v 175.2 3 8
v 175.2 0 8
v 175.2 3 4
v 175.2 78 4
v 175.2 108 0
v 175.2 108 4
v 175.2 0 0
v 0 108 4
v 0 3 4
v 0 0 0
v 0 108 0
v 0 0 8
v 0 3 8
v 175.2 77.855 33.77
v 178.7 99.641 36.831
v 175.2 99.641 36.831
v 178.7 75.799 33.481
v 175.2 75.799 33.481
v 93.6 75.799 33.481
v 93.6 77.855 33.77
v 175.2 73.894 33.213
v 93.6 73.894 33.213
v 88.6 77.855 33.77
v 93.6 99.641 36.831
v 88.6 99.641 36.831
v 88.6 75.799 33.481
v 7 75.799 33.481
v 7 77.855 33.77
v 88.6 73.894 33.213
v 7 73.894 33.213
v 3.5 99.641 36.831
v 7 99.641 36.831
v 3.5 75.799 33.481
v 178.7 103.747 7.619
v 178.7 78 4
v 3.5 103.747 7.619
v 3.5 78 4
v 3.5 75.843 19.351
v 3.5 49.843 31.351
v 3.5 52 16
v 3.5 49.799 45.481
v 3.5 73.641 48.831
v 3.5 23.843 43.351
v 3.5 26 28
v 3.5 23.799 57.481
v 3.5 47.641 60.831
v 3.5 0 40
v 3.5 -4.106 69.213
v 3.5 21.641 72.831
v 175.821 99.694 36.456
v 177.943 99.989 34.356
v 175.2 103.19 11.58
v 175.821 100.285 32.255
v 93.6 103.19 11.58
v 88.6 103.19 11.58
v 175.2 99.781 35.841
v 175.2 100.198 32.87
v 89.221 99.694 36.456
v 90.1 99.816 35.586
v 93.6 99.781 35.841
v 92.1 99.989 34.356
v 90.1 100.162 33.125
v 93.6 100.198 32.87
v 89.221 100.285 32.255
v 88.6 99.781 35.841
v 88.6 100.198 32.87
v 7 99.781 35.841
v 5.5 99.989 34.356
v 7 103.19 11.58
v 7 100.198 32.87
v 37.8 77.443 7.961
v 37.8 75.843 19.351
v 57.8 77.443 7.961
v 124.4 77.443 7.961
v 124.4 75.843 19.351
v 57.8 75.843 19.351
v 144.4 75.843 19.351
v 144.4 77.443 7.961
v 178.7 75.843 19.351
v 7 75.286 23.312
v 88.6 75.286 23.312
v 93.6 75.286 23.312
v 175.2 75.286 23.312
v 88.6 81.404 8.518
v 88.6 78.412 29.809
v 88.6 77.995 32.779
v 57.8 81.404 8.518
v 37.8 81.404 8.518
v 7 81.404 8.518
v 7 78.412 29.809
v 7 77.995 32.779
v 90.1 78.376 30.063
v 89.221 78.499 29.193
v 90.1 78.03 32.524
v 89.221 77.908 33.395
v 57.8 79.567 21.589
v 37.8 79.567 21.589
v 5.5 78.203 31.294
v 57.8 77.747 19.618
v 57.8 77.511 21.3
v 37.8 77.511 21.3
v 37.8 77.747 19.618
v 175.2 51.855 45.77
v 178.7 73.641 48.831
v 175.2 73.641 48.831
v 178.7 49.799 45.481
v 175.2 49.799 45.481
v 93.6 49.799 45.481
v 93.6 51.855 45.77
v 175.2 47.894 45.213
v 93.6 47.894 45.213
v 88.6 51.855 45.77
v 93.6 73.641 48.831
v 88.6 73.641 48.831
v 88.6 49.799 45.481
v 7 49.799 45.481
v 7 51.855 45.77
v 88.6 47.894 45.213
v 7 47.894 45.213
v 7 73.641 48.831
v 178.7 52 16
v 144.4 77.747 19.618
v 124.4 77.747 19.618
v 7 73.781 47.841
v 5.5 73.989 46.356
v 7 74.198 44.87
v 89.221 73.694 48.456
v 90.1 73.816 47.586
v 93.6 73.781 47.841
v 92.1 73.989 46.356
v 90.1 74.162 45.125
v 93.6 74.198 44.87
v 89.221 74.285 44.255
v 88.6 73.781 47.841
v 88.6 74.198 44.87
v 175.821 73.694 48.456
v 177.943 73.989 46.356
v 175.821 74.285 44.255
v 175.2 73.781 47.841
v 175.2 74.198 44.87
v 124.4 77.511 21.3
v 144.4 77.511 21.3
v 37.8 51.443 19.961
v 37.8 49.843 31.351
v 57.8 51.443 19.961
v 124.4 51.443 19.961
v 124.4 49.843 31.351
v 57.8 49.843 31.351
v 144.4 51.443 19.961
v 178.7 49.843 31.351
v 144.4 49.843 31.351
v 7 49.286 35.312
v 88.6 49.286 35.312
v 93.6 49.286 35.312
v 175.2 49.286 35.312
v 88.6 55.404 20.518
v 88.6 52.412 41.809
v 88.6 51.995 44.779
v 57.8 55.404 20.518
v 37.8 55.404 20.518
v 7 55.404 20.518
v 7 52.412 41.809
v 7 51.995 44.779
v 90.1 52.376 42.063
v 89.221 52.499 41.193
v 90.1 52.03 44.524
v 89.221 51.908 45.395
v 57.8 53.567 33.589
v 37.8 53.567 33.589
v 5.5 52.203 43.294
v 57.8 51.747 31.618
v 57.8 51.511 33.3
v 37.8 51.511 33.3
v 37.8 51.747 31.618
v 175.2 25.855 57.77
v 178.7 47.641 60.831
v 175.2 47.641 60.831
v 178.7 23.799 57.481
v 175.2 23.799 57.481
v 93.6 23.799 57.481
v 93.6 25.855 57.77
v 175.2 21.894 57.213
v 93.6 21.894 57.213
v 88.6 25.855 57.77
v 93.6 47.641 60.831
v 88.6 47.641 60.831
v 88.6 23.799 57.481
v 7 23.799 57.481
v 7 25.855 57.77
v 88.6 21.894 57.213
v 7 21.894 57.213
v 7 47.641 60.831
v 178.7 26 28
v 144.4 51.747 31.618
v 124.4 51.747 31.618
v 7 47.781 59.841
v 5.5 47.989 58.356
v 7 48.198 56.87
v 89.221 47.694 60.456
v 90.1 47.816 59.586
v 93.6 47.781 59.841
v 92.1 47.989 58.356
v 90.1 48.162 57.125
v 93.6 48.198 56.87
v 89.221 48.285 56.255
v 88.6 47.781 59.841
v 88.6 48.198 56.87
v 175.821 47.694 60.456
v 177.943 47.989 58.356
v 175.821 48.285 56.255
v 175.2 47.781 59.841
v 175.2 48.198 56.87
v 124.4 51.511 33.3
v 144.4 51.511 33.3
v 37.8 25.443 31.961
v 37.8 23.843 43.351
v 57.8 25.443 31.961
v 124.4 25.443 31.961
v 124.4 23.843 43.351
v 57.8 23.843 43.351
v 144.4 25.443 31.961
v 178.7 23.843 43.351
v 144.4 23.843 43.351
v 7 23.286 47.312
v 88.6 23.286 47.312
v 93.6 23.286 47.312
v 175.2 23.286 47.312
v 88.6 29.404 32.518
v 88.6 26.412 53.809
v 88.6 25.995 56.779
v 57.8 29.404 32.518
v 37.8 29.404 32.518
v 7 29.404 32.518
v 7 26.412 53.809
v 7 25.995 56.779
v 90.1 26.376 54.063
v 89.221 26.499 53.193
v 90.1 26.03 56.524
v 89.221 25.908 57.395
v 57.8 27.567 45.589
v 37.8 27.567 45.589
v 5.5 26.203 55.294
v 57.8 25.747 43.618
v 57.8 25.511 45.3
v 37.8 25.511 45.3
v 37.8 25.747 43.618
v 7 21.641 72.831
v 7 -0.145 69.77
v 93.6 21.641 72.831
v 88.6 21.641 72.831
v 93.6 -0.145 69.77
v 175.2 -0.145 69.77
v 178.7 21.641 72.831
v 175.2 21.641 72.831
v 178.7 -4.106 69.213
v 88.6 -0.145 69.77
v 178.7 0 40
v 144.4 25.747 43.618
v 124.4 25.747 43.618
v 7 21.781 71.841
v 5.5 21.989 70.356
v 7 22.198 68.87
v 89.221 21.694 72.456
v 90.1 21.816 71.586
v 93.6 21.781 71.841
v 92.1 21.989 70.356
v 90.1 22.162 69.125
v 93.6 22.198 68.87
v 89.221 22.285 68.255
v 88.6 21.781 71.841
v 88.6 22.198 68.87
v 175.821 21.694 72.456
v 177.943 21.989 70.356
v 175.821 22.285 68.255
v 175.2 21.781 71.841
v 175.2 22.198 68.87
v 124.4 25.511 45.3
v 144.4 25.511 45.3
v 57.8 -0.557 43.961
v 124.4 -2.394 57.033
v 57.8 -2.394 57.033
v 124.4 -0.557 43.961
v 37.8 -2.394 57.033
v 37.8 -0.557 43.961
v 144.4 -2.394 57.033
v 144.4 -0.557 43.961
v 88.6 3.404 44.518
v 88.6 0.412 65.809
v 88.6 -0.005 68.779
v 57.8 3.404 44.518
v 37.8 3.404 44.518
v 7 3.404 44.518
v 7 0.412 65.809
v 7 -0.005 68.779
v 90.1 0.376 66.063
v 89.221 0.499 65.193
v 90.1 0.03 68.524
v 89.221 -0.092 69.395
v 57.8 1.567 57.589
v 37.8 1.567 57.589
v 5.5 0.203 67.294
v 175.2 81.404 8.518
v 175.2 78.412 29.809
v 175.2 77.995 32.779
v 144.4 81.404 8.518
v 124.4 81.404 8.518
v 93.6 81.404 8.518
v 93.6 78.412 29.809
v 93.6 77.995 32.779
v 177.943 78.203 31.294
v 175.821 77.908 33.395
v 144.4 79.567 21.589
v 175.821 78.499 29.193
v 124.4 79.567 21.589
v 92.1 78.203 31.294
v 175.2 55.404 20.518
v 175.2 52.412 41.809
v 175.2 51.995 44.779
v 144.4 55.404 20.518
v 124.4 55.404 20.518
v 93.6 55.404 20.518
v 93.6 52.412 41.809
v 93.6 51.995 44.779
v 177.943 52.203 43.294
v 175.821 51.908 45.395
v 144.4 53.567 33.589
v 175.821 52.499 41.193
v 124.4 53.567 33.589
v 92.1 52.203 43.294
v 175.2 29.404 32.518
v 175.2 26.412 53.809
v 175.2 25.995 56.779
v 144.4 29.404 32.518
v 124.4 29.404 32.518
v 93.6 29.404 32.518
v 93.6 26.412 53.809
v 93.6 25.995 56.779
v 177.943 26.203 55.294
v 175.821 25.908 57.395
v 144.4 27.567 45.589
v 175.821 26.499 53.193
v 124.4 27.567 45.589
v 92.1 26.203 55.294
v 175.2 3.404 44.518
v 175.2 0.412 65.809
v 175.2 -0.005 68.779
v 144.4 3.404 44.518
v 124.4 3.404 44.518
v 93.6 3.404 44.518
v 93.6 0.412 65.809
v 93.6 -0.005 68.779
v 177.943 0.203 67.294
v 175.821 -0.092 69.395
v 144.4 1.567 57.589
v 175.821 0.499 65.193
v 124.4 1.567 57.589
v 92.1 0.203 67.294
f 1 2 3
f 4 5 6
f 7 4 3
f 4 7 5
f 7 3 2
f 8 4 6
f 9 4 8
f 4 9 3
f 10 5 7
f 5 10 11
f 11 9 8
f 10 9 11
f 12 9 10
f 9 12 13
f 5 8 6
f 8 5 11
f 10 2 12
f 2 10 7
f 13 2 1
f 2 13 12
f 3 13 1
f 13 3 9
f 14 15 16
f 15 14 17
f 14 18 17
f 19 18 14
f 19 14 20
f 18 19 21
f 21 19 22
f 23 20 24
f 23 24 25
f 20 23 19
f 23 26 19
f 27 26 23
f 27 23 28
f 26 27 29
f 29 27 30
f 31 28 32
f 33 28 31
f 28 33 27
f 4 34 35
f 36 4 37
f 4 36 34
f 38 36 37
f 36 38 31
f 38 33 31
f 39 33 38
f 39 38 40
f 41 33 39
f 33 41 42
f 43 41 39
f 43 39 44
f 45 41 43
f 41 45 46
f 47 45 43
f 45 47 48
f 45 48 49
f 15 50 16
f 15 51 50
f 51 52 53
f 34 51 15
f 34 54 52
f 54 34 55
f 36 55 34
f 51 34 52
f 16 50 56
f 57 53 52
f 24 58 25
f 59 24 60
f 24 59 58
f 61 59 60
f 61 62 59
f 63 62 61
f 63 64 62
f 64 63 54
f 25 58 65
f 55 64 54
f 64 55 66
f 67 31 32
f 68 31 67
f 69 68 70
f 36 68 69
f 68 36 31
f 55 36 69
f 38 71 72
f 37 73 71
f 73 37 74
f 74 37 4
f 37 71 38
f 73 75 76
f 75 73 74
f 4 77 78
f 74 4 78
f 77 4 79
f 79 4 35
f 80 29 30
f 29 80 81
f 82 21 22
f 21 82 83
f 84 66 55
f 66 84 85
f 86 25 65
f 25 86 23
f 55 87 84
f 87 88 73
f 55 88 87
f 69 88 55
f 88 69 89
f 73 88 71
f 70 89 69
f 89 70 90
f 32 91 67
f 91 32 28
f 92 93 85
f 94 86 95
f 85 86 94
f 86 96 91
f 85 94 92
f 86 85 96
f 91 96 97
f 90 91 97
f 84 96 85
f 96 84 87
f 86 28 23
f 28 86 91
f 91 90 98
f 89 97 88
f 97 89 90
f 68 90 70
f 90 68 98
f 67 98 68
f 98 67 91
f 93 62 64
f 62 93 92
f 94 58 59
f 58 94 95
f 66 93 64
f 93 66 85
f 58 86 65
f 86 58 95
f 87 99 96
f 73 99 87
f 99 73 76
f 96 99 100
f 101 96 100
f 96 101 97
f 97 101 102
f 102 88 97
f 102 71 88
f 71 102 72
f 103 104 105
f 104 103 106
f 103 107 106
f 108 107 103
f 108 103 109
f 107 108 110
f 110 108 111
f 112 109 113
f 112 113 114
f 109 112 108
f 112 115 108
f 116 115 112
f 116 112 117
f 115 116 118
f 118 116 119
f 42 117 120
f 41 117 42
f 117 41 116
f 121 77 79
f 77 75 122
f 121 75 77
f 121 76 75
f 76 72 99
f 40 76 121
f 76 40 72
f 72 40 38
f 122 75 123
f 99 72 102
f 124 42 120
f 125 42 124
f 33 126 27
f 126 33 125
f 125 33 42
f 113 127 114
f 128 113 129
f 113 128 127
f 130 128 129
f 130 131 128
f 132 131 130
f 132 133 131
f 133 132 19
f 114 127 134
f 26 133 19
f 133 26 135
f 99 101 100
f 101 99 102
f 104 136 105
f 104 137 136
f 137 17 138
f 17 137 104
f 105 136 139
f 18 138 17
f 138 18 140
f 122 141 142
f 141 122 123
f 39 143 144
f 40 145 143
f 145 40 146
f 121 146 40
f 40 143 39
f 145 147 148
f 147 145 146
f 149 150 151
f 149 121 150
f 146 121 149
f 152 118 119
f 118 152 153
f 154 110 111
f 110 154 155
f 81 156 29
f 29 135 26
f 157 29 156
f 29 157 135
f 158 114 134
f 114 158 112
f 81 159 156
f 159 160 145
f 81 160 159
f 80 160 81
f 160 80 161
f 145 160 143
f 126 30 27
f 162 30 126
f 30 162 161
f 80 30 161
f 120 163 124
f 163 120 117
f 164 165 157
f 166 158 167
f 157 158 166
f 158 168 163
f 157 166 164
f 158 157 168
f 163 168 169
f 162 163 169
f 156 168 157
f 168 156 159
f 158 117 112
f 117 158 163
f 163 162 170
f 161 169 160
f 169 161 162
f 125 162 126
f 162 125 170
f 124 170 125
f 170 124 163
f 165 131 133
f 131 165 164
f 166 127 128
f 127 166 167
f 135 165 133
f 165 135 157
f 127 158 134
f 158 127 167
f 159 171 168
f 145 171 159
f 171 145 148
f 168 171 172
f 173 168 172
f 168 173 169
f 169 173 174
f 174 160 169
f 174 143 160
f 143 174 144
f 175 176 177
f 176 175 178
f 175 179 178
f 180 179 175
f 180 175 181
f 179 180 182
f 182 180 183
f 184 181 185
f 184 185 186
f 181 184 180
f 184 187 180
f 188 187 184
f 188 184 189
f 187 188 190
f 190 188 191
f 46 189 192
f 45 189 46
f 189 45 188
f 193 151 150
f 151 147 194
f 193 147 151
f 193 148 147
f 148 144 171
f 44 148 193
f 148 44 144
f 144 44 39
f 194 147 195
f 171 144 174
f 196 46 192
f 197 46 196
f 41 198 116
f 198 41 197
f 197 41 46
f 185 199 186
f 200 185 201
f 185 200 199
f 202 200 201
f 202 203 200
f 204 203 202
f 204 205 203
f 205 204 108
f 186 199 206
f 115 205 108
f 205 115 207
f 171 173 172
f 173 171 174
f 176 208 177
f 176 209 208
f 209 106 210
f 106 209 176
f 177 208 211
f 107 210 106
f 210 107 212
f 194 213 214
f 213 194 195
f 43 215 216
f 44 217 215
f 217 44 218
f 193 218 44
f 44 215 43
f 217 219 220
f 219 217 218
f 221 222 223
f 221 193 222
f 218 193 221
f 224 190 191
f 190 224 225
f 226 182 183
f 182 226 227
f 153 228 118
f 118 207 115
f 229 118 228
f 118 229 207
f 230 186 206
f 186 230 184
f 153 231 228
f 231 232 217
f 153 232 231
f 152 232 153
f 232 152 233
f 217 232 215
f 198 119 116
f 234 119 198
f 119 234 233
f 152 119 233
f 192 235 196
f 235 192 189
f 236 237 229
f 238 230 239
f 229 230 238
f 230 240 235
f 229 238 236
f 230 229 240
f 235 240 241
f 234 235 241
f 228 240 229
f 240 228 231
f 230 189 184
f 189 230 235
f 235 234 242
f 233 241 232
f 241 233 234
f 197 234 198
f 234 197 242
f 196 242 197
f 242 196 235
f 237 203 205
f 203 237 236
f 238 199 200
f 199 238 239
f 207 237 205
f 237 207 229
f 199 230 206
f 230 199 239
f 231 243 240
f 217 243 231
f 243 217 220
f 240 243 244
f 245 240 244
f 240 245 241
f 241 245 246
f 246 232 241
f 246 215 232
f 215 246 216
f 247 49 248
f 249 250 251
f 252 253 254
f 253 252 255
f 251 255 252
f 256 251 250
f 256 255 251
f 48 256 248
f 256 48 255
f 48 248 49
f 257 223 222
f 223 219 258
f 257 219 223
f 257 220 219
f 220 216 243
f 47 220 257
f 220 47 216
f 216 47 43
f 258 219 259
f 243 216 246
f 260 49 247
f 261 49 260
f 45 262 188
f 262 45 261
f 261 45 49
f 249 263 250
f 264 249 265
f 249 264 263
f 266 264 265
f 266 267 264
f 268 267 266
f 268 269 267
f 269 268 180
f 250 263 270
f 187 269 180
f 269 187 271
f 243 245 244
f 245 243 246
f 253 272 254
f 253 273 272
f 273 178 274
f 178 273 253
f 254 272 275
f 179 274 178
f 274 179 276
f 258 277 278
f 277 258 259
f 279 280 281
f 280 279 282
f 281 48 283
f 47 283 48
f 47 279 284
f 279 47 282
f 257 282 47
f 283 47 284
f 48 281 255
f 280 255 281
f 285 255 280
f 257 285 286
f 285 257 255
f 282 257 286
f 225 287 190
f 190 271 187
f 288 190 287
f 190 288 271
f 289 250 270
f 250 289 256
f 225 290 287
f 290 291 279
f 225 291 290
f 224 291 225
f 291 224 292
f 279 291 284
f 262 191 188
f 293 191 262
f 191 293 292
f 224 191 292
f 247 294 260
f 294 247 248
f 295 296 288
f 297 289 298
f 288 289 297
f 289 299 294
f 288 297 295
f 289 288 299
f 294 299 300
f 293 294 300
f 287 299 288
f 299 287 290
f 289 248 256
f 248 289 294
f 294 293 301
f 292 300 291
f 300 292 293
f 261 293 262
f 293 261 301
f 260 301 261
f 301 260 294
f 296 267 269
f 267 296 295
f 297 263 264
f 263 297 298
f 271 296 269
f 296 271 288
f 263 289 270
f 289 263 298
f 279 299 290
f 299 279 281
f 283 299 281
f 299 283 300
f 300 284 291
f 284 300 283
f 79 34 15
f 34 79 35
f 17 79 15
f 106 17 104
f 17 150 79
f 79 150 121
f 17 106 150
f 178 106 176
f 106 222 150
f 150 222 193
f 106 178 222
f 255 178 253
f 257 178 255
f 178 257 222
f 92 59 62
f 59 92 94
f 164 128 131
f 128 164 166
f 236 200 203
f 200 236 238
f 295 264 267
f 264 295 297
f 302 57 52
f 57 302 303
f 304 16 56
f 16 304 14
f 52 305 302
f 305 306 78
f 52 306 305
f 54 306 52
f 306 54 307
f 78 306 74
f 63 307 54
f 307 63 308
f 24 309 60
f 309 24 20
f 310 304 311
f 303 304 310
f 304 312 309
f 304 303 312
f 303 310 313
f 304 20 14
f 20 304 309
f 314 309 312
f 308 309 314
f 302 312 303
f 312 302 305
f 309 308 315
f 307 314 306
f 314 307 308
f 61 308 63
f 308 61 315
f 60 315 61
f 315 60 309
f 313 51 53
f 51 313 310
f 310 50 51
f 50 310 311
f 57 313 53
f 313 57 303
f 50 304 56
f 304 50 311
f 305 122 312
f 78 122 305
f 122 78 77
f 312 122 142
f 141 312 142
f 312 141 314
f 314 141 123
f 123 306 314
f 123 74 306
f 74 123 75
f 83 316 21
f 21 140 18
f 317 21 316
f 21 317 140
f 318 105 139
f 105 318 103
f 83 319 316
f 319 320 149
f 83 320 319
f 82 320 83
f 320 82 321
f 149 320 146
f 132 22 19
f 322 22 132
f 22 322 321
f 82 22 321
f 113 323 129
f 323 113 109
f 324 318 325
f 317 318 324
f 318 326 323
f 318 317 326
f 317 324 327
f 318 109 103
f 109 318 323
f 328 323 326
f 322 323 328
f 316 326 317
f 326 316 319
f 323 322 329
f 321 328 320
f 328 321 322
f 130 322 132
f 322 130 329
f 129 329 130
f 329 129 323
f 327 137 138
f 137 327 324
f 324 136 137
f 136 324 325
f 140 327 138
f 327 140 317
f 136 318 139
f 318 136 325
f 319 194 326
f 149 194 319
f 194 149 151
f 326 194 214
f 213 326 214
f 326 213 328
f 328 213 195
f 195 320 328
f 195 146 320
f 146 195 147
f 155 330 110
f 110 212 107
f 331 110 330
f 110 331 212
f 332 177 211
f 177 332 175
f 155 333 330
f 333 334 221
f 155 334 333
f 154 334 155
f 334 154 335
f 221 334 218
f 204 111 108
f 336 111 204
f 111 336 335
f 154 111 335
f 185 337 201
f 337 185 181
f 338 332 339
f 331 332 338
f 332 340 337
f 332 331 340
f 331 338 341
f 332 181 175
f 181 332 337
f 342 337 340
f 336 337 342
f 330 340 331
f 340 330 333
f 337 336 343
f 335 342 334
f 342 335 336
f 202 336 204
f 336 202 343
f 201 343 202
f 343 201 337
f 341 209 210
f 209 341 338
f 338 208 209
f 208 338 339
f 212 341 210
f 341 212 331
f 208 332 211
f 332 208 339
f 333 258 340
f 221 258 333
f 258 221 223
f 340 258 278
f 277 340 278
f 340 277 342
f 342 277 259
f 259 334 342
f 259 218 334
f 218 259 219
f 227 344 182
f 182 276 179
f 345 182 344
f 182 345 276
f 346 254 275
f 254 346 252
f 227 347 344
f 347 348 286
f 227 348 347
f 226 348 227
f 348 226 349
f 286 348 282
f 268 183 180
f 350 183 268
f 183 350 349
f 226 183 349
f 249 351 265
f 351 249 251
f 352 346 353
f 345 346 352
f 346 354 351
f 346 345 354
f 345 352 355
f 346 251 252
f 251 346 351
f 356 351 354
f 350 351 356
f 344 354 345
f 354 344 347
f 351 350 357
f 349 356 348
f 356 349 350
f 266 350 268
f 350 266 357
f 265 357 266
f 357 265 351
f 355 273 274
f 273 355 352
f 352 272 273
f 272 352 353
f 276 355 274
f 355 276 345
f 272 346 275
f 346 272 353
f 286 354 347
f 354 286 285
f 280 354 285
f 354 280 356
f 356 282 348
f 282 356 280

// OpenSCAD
// pb_slab_display_v1.scad — PrimeBind PSA Card Show Display
//
// Freestanding waterfall stand for PSA slabs at vendor shows.
// 2 columns × 4 rows = 8 slabs visible simultaneously.
// Slabs slot in from the top, tilt 8° back — stable, easy to pull out.
// Grade label and card face fully visible from the front.
//
// Workflow: transport in slab book → transfer slabs to display at show
//
// Print: Matte PLA | flat on bed | no supports
// Minitest: scale to 40% to verify slot fit before full print

// ── PSA slab (confirmed dimensions) ─────────────────────────────────────────
SLAB_W = 81.0;    // 3.19″
SLAB_H = 136.5;   // 5.38″
SLAB_T = 6.35;    // 0.25″

// ── Layout ───────────────────────────────────────────────────────────────────
COLS = 2;
ROWS = 4;

// ── Slot geometry ─────────────────────────────────────────────────────────────
SLOT_W     = SLAB_W + 0.6;   // 81.6mm — snug but hand-removable
SLOT_DEPTH = 22;              // how deep slab sits in slot (bottom lip)
SLOT_TILT  = 8;               // degrees backward — stable, grade label visible
LIP_H      = 4;               // bottom ledge height that slab rests on

// ── Structure ─────────────────────────────────────────────────────────────────
WALL       = 3.5;   // side walls and dividers between columns
COL_GAP    = 5;     // gap between the two columns (wider for finger access)
BASE_T     = 4;     // base plate thickness
BACK_T     = 4;     // back wall thickness

// ── Row stepping (cascade) ────────────────────────────────────────────────────
// Each row steps back and up, creating the waterfall silhouette.
// Deeper step = more separation = easier to grab individual slabs.
ROW_STEP_D = 26;    // horizontal depth per step (front to back)
ROW_STEP_H = 12;    // height rise per step

// ── Derived ───────────────────────────────────────────────────────────────────
// Slot internal height — slab sits SLOT_DEPTH deep, the rest is open above
// The slot guides the slab sides; bottom lip stops it from sliding through
SLOT_H_INTERNAL = SLOT_DEPTH + LIP_H;

// Total stand width
STAND_W = WALL + SLOT_W + COL_GAP + SLOT_W + WALL;   // ~178mm

// Total stand depth (base plate)
STAND_D = ROWS * ROW_STEP_D + BACK_T;   // ~108mm

// Total stand height at back row
STAND_H = BASE_T + ROWS * ROW_STEP_H + SLOT_H_INTERNAL;   // ~90mm

echo("─────────────────────────────────────");
echo("Stand footprint:", STAND_W, "×", STAND_D, "mm");
echo("Stand height:", STAND_H, "mm");
echo("Slot width:", SLOT_W, "mm");
echo("─────────────────────────────────────");


// ── Single slot ───────────────────────────────────────────────────────────────
// A slot holds one PSA slab. The slab enters from the top, rests on the
// lip at the bottom, and is cradled by two side walls.
// The assembly is rotated SLOT_TILT° so the slab leans back.
module slot(col_x, row) {
    x = col_x;
    // Each row steps back (y) and up (z)
    base_z = BASE_T + row * ROW_STEP_H;
    base_y = (ROWS - 1 - row) * ROW_STEP_D;  // row 0 = front, row 3 = back

    translate([x, base_y, base_z])
    rotate([SLOT_TILT, 0, 0])
    difference() {
        // Outer slot body
        cube([SLOT_W + WALL*2, BACK_T + SLOT_DEPTH, SLOT_H_INTERNAL + WALL]);

        // Inner slot void (slab sits here)
        translate([WALL, BACK_T, LIP_H])
            cube([SLOT_W, SLOT_DEPTH + 0.1, SLOT_H_INTERNAL]);

        // Chamfer at top opening to guide slab in
        translate([WALL - 1.5, BACK_T, LIP_H + SLOT_H_INTERNAL - 3])
            rotate([0, 45, 0])
            cube([3, SLOT_DEPTH + 1, 3]);
        translate([WALL + SLOT_W - 1.5, BACK_T, LIP_H + SLOT_H_INTERNAL - 3])
            rotate([0, 45, 0])
            cube([3, SLOT_DEPTH + 1, 3]);

        // Finger notch in back wall — reach behind slab to push it up
        translate([WALL + SLOT_W/2 - 10, -0.1, LIP_H])
            cube([20, BACK_T + 0.2, SLOT_DEPTH * 0.6]);
    }
}


// ── Base plate ────────────────────────────────────────────────────────────────
module base_plate() {
    cube([STAND_W, STAND_D, BASE_T]);

    // Small front lip to stop slabs if pulled forward too aggressively
    translate([0, 0, BASE_T])
        cube([STAND_W, 3, 4]);
}


// ── Full display stand ────────────────────────────────────────────────────────
module slab_display() {
    // Base
    base_plate();

    // Column x origins: left column and right column
    col_x = [WALL, WALL + SLOT_W + COL_GAP];

    // Slots — 2 columns × 4 rows
    for (c = [0 : COLS-1]) {
        for (r = [0 : ROWS-1]) {
            slot(col_x[c], r);
        }
    }
}


// ── Render ────────────────────────────────────────────────────────────────────
slab_display();
